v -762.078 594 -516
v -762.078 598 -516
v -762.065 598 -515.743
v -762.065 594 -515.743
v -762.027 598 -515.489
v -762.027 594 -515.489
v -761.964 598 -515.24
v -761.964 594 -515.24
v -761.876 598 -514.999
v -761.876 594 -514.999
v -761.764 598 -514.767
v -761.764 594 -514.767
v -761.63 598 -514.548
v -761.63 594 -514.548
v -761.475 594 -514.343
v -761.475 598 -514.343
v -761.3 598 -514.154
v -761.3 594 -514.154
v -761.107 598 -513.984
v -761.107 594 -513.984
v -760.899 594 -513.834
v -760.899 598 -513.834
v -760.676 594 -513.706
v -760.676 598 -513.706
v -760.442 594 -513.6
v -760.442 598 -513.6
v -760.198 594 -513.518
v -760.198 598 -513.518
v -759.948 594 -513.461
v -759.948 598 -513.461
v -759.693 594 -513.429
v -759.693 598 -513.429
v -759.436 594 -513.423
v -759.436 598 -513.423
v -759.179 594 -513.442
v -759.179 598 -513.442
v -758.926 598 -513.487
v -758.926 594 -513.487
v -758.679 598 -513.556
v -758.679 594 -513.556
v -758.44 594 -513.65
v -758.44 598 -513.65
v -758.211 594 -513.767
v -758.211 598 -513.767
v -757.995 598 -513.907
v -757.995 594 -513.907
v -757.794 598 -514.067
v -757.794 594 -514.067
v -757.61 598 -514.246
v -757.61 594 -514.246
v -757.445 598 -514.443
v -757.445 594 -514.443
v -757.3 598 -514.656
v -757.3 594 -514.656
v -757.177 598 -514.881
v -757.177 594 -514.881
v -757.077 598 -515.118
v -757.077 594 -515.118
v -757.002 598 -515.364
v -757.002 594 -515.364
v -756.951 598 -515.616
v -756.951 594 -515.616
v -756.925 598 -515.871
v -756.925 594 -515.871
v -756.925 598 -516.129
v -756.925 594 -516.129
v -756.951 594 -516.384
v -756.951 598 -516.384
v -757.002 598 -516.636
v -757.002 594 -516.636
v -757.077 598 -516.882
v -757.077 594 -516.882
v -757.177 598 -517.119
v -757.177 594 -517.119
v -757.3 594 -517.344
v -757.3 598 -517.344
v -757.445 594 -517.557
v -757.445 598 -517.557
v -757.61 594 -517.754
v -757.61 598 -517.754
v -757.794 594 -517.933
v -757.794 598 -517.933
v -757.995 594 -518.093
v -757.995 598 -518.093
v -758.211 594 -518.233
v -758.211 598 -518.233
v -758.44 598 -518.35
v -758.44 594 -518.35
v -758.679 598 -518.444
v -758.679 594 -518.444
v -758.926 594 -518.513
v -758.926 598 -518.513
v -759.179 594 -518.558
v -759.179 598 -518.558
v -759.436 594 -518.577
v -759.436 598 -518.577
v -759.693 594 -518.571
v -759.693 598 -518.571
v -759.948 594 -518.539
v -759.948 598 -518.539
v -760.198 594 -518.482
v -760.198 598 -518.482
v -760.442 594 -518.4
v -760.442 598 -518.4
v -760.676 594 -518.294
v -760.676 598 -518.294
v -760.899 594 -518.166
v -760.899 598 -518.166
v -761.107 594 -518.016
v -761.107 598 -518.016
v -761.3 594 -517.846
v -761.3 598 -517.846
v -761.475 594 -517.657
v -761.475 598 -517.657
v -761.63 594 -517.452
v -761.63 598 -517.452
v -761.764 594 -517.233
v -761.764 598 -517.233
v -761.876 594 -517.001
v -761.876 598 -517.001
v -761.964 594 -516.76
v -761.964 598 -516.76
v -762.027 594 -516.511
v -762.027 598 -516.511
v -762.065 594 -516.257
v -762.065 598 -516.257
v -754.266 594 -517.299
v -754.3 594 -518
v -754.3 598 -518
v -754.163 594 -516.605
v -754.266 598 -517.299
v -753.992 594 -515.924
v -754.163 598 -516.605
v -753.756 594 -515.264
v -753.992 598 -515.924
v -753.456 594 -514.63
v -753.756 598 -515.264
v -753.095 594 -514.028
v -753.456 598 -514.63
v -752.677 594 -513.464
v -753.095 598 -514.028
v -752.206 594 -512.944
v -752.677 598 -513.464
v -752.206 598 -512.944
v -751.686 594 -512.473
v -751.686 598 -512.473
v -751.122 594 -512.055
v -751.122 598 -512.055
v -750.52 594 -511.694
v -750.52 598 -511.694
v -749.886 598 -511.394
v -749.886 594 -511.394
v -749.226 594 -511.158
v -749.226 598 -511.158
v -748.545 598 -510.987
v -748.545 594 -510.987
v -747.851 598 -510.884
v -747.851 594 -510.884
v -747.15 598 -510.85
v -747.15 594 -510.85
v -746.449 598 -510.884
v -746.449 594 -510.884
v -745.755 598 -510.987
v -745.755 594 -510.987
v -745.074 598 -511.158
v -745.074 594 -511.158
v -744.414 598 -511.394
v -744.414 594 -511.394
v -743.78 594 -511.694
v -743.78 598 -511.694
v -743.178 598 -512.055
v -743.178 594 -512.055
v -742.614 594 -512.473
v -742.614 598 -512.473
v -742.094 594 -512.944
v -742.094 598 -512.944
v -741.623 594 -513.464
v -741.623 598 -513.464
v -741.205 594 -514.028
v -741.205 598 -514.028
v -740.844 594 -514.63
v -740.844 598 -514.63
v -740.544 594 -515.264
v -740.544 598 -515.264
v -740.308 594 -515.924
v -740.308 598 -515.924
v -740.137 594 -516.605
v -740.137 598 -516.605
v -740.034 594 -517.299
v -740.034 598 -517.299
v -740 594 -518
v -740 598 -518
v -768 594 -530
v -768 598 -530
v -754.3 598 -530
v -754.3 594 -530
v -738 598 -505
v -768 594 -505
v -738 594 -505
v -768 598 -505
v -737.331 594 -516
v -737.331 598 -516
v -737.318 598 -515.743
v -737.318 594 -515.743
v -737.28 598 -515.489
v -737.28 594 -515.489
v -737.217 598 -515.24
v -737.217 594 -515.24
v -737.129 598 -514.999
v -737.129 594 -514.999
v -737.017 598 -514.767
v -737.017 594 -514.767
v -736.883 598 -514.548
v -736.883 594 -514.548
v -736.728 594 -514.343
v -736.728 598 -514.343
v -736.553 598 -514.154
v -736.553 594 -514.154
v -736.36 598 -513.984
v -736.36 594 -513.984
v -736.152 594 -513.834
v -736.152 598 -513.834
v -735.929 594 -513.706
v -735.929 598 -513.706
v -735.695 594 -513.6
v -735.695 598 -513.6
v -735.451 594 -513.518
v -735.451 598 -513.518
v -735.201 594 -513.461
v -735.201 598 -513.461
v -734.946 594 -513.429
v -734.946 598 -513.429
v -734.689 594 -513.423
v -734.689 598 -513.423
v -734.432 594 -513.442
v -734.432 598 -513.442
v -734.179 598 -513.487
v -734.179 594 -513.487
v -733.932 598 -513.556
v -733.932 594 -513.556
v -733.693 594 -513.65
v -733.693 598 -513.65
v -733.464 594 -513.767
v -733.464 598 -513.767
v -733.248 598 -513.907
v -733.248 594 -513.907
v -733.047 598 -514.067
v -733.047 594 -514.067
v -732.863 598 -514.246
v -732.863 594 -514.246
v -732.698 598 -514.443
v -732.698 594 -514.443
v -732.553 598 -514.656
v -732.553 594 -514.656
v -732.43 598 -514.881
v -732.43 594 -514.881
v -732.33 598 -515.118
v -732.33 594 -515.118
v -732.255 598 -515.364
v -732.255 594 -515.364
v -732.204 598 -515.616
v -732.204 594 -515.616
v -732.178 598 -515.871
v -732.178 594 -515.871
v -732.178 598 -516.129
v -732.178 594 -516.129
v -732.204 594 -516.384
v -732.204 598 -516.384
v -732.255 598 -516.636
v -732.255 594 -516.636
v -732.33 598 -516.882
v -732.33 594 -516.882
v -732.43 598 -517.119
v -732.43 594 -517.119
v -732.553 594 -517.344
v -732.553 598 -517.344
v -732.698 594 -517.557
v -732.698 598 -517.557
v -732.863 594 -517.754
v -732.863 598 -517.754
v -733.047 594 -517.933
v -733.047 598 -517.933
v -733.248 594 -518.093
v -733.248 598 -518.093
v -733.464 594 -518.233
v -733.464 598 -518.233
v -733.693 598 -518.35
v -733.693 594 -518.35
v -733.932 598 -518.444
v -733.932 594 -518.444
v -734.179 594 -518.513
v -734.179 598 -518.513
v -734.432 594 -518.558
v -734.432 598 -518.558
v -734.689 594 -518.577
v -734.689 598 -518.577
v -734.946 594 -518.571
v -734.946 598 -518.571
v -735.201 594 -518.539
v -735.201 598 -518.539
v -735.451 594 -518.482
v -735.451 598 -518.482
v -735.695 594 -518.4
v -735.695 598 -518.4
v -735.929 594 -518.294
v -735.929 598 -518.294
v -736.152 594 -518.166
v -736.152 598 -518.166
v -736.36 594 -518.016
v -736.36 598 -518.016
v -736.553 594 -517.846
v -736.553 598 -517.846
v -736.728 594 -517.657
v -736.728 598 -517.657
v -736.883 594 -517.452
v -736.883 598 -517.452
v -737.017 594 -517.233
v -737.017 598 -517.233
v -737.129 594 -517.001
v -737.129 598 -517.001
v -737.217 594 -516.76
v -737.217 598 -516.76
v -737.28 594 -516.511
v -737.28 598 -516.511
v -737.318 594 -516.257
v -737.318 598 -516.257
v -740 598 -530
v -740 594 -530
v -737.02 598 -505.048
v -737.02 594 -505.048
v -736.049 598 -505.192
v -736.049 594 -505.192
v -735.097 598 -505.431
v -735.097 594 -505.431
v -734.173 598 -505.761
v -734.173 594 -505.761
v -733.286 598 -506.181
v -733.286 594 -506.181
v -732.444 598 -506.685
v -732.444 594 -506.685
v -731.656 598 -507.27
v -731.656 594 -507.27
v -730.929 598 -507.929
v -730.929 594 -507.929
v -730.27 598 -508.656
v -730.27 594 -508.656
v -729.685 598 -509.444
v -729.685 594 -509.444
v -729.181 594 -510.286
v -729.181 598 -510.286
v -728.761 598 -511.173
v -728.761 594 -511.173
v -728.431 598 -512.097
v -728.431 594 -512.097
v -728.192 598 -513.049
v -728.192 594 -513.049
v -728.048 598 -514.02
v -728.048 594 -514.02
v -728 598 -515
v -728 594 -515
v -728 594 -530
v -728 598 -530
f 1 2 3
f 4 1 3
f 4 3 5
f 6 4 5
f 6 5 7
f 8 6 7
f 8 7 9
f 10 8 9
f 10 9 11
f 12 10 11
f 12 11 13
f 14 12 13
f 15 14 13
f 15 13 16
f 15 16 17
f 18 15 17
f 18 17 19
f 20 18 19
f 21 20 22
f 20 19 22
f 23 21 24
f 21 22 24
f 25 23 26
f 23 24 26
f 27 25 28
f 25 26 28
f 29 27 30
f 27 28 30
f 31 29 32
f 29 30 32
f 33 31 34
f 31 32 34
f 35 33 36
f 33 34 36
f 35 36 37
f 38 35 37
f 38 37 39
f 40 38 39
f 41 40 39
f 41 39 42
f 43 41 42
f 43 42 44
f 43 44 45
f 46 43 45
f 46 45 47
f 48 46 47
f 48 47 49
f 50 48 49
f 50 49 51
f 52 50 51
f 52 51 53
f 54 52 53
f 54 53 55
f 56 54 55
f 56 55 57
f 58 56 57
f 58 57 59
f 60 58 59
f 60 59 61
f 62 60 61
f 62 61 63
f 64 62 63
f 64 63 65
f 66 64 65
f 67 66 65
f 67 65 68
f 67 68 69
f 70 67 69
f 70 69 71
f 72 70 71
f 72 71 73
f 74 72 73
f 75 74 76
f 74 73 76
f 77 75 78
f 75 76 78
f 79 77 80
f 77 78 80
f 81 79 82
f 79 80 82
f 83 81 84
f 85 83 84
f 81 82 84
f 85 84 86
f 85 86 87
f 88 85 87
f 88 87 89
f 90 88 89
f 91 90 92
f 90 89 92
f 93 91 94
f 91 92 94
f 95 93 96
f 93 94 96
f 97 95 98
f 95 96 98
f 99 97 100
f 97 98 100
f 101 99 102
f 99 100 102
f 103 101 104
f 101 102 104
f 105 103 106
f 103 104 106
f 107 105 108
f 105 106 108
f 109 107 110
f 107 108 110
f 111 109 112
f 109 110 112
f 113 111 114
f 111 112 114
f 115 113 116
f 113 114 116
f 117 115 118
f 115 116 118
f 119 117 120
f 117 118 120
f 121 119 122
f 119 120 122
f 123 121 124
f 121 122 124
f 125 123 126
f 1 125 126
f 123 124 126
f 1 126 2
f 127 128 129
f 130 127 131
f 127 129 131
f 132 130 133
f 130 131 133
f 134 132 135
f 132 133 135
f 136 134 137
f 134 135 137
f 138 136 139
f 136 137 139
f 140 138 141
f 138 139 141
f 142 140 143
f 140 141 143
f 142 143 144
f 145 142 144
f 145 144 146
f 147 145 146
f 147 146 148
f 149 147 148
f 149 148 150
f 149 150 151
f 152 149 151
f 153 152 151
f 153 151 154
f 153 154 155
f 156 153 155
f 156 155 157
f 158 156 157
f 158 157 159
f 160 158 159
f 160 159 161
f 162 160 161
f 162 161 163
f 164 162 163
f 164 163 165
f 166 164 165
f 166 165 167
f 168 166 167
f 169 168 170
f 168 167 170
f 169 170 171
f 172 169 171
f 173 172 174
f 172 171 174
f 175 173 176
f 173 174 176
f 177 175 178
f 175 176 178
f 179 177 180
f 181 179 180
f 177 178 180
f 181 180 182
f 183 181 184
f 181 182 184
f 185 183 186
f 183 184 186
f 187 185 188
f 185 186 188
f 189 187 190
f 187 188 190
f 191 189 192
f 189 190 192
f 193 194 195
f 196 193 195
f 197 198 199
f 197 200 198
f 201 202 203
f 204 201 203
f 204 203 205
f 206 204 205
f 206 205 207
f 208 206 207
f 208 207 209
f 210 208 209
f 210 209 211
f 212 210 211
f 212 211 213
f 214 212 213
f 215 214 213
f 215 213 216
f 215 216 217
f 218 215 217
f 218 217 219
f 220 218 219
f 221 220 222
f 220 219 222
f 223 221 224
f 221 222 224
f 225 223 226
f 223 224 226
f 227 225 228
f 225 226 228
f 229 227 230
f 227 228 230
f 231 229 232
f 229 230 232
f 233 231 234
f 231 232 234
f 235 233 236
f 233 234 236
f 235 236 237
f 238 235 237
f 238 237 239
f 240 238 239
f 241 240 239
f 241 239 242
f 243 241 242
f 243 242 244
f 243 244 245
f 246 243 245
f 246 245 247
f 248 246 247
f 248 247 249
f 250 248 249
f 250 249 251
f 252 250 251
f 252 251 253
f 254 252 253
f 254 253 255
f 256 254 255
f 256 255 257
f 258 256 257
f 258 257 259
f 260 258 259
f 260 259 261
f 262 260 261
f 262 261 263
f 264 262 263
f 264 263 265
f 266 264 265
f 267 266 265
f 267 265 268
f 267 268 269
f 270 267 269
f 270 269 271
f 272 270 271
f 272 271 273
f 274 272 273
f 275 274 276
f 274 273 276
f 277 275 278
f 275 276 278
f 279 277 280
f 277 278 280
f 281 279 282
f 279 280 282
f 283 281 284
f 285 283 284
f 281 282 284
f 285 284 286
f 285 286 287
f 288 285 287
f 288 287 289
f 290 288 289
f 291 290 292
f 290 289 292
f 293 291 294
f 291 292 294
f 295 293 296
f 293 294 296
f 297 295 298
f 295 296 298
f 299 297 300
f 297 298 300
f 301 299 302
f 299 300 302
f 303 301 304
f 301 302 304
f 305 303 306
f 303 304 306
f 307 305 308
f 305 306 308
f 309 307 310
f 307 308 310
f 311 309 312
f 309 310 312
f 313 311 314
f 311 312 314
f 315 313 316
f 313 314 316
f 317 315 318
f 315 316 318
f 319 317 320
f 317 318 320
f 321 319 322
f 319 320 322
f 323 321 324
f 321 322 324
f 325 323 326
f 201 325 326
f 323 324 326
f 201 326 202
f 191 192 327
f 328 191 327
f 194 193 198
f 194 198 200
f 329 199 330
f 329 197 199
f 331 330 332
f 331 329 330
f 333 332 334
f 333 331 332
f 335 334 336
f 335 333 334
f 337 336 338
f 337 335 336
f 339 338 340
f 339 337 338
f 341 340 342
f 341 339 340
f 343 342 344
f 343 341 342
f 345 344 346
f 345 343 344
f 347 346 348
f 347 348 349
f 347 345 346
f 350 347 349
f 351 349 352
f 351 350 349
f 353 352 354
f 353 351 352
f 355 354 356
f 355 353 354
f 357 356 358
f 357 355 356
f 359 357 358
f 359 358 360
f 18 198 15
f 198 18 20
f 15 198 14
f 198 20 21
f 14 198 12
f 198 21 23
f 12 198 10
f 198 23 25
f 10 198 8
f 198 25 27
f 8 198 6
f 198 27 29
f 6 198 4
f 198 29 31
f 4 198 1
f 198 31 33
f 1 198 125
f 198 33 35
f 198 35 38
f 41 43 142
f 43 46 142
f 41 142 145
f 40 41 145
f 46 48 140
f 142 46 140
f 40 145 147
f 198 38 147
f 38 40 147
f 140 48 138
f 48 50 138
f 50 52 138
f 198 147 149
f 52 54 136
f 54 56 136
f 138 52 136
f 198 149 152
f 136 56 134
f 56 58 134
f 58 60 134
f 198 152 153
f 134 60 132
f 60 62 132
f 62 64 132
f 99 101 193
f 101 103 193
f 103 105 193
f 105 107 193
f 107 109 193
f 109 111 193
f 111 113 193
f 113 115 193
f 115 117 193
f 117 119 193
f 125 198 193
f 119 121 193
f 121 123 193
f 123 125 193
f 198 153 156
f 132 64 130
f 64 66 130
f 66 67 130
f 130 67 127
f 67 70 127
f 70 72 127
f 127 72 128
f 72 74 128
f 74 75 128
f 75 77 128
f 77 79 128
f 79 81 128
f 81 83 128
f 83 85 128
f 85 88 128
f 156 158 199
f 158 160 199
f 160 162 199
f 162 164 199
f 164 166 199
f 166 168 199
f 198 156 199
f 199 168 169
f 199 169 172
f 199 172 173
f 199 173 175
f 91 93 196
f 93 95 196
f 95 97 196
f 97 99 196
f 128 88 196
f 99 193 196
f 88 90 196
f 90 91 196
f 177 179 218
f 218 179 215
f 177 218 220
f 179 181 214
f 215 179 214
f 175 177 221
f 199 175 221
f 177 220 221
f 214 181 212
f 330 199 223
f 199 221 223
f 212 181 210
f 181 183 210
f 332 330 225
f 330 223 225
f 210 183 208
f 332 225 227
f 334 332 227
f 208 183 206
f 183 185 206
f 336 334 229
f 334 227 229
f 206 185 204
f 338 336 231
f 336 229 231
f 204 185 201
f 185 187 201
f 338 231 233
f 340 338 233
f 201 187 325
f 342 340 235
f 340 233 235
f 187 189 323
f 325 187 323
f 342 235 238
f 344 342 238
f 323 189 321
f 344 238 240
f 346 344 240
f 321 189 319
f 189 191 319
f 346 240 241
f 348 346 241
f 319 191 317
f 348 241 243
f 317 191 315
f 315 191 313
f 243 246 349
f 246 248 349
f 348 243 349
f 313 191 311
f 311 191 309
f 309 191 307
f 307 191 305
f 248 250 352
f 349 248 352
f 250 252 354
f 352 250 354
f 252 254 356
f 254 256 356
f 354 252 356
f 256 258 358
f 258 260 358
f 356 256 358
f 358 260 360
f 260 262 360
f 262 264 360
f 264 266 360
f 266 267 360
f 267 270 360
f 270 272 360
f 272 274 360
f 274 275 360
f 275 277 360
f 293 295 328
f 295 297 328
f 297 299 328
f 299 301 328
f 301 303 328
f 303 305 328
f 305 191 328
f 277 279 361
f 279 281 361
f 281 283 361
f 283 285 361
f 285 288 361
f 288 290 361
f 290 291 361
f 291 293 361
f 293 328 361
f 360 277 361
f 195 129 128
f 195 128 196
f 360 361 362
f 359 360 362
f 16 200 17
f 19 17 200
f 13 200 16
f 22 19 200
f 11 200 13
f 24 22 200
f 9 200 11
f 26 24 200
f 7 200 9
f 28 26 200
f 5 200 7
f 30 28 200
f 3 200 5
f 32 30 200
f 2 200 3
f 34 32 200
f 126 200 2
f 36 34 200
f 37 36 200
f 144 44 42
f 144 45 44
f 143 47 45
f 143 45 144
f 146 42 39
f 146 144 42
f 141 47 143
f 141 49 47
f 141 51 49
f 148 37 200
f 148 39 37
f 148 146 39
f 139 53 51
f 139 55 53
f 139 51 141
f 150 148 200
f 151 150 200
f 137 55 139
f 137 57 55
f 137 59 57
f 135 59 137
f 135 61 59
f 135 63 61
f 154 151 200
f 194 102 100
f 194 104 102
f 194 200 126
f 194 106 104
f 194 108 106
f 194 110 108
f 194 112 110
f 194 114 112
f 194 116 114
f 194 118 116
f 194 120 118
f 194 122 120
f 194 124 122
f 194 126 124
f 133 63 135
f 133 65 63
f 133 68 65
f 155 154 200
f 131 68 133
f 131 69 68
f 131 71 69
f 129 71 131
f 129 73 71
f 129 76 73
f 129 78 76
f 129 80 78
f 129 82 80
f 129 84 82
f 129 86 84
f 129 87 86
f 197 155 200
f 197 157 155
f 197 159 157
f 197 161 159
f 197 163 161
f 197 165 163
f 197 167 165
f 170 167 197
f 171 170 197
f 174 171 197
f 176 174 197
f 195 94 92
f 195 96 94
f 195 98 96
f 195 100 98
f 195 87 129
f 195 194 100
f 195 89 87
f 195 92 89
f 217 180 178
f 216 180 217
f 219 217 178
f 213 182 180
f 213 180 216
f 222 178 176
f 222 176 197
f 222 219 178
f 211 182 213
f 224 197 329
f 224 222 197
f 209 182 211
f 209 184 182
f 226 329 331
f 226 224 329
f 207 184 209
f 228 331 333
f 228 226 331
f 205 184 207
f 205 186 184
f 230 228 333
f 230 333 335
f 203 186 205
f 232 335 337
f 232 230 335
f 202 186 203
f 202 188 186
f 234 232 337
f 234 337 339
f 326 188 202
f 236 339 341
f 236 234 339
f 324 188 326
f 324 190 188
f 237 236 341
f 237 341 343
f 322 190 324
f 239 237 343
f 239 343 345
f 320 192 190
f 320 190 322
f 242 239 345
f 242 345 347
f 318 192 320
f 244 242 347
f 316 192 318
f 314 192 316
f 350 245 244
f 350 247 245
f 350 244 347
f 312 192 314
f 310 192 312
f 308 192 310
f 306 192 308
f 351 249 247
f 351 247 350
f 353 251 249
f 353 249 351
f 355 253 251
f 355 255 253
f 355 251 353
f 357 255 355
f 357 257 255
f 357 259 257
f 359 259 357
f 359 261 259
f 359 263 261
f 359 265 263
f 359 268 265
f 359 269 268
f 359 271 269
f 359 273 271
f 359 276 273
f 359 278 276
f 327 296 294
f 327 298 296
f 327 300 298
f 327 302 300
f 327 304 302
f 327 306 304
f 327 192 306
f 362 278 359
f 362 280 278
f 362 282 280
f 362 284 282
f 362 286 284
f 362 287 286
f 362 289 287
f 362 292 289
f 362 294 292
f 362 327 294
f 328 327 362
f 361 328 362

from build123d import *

# Parameters (mm, degrees)
BOX001_W        = 40
BOX001_H        = 4
BOX001_DEPTH    = 25
SKETCH002_R     = 2.5781
POCKET002_DEPTH = 4.001
FILLET_R        = 10


with BuildPart() as part:
    # Box001 → Box001 (new body)
    with BuildSketch(Plane(origin=(-768, 594, -530), x_dir=(1, 0, 0), z_dir=(0, 0, 1))):
        with Locations((20, 2)):
            Rectangle(BOX001_W, BOX001_H)
    extrude(amount=BOX001_DEPTH)

    # Sketch002 → Pocket002 (cut, through all)
    with BuildSketch(Plane(origin=(-768, 598, -530), x_dir=(-1, 0, 0), z_dir=(0, 1, 0))):
        with Locations((-33.247, 14)):
            Circle(SKETCH002_R)
        with Locations((-8.5, 14)):
            Circle(SKETCH002_R)
        with BuildLine():
            ThreePointArc((-13.7, 12), (-20.85, 19.15), (-28, 12))
            Line((-28, 12), (-28, 0))
            Line((-28, 0), (-13.7, 0))
            Line((-13.7, 12), (-13.7, 0))
        make_face()
    extrude(amount=-POCKET002_DEPTH, mode=Mode.SUBTRACT)

    # Fillet
    fillet_edges = [part.edges().sort_by_distance(p)[0] for p in [
        (-728, 596, -505),
    ]]
    fillet(fillet_edges, radius=FILLET_R)


solid = part.part
